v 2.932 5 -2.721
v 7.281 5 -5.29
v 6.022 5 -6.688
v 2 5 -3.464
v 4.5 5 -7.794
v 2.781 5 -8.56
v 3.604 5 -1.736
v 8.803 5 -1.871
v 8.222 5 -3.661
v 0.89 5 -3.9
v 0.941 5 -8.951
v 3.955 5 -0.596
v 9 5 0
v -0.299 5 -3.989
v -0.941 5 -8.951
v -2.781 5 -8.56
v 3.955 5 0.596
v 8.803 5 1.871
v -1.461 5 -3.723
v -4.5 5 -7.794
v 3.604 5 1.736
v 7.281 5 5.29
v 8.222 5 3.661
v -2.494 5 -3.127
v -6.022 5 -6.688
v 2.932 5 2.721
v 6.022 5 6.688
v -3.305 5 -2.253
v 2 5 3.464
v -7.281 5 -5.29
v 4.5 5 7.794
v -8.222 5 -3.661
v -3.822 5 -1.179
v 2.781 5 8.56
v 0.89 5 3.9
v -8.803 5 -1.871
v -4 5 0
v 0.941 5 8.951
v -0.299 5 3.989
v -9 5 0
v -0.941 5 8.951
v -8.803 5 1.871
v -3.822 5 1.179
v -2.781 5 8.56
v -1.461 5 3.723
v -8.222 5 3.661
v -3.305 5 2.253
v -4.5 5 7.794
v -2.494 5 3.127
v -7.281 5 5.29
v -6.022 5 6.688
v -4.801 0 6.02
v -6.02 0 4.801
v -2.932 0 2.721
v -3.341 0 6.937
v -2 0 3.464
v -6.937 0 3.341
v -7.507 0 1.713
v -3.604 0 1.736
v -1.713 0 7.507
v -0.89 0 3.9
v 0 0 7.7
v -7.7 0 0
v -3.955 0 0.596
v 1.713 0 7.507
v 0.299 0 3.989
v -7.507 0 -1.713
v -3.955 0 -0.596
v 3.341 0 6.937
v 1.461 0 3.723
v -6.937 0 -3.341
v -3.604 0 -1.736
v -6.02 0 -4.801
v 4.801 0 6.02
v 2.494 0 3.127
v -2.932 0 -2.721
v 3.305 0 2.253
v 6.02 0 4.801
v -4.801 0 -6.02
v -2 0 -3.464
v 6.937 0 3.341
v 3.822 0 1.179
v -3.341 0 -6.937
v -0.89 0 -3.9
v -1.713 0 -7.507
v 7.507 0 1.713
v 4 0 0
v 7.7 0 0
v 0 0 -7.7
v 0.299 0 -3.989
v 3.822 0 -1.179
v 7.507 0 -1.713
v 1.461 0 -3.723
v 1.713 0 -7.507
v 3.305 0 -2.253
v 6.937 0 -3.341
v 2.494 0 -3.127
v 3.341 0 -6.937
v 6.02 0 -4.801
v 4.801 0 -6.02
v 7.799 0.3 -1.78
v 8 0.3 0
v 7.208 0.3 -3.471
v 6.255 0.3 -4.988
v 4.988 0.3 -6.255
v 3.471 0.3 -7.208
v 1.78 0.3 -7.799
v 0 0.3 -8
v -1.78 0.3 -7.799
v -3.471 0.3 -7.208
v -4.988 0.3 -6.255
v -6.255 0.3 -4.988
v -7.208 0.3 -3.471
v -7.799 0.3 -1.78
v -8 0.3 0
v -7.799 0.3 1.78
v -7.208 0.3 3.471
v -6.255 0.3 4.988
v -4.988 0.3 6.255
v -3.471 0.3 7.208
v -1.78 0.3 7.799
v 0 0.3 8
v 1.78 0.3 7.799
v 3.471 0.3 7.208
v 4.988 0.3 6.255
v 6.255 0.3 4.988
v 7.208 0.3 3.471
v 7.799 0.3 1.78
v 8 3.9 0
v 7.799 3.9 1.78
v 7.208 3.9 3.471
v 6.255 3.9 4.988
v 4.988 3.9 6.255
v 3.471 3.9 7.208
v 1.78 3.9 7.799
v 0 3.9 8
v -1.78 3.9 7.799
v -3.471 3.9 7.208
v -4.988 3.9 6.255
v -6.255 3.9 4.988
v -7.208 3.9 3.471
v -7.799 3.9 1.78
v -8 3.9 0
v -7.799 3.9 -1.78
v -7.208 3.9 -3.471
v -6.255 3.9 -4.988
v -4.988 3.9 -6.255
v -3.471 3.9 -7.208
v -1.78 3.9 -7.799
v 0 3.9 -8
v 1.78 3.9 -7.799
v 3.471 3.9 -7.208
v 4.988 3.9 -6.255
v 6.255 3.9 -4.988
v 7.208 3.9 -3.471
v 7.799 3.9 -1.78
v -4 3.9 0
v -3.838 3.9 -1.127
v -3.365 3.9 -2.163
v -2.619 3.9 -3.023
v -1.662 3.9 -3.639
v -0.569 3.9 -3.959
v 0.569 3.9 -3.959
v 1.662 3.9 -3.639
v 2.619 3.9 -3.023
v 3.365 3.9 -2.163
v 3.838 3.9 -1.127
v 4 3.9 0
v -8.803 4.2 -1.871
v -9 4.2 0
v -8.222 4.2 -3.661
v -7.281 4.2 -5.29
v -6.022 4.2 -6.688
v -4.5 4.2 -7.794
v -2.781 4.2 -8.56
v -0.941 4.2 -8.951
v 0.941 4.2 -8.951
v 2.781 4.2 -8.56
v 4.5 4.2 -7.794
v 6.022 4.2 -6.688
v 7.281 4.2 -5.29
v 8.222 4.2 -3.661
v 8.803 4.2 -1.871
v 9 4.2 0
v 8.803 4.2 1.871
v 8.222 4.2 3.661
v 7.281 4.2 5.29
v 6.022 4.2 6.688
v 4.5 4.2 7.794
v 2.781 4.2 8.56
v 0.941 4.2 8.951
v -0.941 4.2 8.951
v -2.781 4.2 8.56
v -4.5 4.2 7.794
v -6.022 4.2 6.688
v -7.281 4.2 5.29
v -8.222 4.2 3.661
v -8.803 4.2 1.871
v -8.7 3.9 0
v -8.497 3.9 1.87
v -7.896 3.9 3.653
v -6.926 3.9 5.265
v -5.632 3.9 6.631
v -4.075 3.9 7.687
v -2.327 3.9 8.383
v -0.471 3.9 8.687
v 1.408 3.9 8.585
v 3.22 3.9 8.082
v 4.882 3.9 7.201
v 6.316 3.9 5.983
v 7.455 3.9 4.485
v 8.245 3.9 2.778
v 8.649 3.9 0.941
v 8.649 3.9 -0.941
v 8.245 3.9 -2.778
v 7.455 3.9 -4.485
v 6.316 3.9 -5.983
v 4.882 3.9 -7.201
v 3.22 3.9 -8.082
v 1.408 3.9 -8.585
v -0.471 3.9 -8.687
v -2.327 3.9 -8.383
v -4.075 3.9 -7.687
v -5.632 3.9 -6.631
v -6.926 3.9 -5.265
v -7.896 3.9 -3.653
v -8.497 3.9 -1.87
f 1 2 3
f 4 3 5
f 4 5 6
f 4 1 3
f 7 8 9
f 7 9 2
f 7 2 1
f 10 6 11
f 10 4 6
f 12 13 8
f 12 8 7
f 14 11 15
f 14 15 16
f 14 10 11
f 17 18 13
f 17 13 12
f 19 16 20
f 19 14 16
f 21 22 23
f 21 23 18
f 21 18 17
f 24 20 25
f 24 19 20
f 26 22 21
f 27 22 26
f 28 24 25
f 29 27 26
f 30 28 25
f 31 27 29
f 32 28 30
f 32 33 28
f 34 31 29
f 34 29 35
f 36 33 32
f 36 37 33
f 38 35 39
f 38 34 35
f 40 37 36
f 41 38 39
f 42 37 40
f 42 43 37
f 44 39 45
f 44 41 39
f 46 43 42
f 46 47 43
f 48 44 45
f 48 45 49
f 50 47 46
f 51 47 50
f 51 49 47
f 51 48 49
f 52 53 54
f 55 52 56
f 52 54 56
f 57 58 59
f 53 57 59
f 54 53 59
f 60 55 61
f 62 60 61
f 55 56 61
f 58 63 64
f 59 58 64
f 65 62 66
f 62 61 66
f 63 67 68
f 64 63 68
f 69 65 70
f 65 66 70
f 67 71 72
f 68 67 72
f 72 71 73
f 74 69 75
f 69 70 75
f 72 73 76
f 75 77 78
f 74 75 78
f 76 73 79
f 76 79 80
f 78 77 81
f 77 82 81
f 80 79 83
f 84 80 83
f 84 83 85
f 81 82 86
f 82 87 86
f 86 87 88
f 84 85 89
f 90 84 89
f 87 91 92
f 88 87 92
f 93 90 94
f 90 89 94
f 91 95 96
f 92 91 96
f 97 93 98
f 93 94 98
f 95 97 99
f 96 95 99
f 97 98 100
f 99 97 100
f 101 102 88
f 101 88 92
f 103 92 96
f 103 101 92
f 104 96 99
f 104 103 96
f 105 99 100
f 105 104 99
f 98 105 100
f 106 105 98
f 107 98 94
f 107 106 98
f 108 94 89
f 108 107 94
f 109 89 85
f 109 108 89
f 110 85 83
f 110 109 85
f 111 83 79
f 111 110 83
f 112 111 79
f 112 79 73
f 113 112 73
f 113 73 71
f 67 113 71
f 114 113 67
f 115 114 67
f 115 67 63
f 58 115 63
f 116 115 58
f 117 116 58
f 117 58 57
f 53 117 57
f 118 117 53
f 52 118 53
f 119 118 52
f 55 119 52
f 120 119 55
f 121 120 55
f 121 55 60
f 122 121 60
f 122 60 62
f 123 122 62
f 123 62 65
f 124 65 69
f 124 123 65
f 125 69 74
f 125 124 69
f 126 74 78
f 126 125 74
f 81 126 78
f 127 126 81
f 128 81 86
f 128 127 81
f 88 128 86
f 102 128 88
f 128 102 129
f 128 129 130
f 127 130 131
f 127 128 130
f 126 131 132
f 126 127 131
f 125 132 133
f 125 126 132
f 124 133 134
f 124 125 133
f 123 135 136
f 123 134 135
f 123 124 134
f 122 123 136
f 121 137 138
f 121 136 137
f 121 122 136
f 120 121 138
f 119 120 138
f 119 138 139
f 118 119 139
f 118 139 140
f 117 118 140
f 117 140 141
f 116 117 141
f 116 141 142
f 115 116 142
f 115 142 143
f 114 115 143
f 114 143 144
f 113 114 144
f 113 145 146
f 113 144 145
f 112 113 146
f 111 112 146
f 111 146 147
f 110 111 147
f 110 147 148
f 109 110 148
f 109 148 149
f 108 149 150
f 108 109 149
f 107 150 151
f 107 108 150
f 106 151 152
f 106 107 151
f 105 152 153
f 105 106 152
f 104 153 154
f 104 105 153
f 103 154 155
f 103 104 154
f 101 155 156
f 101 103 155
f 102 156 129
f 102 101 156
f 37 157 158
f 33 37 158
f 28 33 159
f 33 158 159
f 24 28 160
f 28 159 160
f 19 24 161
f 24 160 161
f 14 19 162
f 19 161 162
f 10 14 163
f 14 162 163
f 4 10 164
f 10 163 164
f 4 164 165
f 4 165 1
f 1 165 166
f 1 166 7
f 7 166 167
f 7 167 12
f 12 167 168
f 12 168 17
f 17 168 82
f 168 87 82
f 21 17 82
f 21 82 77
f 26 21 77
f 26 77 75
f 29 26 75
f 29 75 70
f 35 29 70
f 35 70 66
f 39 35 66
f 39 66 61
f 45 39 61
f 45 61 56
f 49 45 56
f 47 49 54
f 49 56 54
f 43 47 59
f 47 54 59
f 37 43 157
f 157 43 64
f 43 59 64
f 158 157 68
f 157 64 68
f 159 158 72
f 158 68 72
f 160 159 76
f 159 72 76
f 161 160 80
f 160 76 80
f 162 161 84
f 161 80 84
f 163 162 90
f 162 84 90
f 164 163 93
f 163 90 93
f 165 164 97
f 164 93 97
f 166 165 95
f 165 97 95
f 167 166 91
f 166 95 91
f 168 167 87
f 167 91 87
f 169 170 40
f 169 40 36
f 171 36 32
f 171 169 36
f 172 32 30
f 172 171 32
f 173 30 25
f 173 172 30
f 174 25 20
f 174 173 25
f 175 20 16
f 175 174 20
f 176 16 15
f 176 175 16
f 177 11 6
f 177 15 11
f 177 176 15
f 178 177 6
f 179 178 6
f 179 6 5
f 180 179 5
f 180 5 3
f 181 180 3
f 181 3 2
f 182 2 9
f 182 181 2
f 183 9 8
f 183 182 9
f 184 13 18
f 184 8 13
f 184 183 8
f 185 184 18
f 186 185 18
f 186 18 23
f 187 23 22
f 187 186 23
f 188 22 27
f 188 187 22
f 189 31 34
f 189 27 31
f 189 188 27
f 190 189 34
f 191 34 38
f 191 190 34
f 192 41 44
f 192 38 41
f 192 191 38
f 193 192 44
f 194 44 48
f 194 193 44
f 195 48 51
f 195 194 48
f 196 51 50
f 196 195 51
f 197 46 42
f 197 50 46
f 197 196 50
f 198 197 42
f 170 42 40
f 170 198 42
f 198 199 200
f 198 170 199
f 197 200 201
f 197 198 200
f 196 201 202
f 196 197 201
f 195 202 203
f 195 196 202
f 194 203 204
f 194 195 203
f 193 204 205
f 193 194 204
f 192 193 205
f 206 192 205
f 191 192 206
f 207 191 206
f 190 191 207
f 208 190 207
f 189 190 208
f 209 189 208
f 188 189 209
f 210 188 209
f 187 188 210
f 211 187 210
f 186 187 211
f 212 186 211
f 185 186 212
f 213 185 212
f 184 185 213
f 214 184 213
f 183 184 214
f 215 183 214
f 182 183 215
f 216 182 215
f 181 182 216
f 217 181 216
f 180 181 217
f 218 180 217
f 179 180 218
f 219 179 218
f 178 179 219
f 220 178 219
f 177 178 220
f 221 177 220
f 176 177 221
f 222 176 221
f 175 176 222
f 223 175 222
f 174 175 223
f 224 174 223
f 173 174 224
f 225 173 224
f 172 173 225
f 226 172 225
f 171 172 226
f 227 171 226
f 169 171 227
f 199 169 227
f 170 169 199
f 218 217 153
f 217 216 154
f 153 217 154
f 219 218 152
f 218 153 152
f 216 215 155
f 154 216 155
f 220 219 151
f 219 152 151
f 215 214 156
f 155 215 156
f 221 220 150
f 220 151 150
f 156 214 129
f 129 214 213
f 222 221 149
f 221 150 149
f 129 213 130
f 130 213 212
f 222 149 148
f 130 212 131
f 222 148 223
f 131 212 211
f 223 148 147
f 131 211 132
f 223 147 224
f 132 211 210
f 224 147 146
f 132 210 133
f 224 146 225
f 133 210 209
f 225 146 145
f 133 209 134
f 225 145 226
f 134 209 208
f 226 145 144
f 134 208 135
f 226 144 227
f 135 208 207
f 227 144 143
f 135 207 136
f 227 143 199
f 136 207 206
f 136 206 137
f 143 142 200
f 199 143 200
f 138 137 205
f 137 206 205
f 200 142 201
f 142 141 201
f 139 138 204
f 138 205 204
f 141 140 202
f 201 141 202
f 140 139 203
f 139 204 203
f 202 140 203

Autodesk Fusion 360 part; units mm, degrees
sketch "Esboço1" plane through (0, 0, 0) normal (0, 1, 0) x (1, 0, 0)
  circle A0 centre (0, 0) radius 8
  circle A1 centre (0, 0) radius 4
  dimension "d1" = 16
  dimension "d2" = 8
extrude "Extrusão1" add sketch "Esboço1" along normal blind 3.9
sketch "Esboço2" plane through (0, 3.9, 0) normal (0, 1, 0) x (-1, 0, 0)
  circle A0 centre (0, 0) radius 4
  circle A1 centre (0, 0) radius 8
  circle A2 centre (0, 0) radius 9
  dimension "d5" = 18
extrude "Extrusão2" add sketch "Esboço2" along normal blind 1.1 contours A1 | A2
chamfer "Chanfro1" distance 0.3 angle 45 1 edges at (-7.4586, 0, 2.8929)
chamfer "Chanfro2" distance 0.3 angle 45 1 edges at (8.3909, 3.9, -3.2545)
